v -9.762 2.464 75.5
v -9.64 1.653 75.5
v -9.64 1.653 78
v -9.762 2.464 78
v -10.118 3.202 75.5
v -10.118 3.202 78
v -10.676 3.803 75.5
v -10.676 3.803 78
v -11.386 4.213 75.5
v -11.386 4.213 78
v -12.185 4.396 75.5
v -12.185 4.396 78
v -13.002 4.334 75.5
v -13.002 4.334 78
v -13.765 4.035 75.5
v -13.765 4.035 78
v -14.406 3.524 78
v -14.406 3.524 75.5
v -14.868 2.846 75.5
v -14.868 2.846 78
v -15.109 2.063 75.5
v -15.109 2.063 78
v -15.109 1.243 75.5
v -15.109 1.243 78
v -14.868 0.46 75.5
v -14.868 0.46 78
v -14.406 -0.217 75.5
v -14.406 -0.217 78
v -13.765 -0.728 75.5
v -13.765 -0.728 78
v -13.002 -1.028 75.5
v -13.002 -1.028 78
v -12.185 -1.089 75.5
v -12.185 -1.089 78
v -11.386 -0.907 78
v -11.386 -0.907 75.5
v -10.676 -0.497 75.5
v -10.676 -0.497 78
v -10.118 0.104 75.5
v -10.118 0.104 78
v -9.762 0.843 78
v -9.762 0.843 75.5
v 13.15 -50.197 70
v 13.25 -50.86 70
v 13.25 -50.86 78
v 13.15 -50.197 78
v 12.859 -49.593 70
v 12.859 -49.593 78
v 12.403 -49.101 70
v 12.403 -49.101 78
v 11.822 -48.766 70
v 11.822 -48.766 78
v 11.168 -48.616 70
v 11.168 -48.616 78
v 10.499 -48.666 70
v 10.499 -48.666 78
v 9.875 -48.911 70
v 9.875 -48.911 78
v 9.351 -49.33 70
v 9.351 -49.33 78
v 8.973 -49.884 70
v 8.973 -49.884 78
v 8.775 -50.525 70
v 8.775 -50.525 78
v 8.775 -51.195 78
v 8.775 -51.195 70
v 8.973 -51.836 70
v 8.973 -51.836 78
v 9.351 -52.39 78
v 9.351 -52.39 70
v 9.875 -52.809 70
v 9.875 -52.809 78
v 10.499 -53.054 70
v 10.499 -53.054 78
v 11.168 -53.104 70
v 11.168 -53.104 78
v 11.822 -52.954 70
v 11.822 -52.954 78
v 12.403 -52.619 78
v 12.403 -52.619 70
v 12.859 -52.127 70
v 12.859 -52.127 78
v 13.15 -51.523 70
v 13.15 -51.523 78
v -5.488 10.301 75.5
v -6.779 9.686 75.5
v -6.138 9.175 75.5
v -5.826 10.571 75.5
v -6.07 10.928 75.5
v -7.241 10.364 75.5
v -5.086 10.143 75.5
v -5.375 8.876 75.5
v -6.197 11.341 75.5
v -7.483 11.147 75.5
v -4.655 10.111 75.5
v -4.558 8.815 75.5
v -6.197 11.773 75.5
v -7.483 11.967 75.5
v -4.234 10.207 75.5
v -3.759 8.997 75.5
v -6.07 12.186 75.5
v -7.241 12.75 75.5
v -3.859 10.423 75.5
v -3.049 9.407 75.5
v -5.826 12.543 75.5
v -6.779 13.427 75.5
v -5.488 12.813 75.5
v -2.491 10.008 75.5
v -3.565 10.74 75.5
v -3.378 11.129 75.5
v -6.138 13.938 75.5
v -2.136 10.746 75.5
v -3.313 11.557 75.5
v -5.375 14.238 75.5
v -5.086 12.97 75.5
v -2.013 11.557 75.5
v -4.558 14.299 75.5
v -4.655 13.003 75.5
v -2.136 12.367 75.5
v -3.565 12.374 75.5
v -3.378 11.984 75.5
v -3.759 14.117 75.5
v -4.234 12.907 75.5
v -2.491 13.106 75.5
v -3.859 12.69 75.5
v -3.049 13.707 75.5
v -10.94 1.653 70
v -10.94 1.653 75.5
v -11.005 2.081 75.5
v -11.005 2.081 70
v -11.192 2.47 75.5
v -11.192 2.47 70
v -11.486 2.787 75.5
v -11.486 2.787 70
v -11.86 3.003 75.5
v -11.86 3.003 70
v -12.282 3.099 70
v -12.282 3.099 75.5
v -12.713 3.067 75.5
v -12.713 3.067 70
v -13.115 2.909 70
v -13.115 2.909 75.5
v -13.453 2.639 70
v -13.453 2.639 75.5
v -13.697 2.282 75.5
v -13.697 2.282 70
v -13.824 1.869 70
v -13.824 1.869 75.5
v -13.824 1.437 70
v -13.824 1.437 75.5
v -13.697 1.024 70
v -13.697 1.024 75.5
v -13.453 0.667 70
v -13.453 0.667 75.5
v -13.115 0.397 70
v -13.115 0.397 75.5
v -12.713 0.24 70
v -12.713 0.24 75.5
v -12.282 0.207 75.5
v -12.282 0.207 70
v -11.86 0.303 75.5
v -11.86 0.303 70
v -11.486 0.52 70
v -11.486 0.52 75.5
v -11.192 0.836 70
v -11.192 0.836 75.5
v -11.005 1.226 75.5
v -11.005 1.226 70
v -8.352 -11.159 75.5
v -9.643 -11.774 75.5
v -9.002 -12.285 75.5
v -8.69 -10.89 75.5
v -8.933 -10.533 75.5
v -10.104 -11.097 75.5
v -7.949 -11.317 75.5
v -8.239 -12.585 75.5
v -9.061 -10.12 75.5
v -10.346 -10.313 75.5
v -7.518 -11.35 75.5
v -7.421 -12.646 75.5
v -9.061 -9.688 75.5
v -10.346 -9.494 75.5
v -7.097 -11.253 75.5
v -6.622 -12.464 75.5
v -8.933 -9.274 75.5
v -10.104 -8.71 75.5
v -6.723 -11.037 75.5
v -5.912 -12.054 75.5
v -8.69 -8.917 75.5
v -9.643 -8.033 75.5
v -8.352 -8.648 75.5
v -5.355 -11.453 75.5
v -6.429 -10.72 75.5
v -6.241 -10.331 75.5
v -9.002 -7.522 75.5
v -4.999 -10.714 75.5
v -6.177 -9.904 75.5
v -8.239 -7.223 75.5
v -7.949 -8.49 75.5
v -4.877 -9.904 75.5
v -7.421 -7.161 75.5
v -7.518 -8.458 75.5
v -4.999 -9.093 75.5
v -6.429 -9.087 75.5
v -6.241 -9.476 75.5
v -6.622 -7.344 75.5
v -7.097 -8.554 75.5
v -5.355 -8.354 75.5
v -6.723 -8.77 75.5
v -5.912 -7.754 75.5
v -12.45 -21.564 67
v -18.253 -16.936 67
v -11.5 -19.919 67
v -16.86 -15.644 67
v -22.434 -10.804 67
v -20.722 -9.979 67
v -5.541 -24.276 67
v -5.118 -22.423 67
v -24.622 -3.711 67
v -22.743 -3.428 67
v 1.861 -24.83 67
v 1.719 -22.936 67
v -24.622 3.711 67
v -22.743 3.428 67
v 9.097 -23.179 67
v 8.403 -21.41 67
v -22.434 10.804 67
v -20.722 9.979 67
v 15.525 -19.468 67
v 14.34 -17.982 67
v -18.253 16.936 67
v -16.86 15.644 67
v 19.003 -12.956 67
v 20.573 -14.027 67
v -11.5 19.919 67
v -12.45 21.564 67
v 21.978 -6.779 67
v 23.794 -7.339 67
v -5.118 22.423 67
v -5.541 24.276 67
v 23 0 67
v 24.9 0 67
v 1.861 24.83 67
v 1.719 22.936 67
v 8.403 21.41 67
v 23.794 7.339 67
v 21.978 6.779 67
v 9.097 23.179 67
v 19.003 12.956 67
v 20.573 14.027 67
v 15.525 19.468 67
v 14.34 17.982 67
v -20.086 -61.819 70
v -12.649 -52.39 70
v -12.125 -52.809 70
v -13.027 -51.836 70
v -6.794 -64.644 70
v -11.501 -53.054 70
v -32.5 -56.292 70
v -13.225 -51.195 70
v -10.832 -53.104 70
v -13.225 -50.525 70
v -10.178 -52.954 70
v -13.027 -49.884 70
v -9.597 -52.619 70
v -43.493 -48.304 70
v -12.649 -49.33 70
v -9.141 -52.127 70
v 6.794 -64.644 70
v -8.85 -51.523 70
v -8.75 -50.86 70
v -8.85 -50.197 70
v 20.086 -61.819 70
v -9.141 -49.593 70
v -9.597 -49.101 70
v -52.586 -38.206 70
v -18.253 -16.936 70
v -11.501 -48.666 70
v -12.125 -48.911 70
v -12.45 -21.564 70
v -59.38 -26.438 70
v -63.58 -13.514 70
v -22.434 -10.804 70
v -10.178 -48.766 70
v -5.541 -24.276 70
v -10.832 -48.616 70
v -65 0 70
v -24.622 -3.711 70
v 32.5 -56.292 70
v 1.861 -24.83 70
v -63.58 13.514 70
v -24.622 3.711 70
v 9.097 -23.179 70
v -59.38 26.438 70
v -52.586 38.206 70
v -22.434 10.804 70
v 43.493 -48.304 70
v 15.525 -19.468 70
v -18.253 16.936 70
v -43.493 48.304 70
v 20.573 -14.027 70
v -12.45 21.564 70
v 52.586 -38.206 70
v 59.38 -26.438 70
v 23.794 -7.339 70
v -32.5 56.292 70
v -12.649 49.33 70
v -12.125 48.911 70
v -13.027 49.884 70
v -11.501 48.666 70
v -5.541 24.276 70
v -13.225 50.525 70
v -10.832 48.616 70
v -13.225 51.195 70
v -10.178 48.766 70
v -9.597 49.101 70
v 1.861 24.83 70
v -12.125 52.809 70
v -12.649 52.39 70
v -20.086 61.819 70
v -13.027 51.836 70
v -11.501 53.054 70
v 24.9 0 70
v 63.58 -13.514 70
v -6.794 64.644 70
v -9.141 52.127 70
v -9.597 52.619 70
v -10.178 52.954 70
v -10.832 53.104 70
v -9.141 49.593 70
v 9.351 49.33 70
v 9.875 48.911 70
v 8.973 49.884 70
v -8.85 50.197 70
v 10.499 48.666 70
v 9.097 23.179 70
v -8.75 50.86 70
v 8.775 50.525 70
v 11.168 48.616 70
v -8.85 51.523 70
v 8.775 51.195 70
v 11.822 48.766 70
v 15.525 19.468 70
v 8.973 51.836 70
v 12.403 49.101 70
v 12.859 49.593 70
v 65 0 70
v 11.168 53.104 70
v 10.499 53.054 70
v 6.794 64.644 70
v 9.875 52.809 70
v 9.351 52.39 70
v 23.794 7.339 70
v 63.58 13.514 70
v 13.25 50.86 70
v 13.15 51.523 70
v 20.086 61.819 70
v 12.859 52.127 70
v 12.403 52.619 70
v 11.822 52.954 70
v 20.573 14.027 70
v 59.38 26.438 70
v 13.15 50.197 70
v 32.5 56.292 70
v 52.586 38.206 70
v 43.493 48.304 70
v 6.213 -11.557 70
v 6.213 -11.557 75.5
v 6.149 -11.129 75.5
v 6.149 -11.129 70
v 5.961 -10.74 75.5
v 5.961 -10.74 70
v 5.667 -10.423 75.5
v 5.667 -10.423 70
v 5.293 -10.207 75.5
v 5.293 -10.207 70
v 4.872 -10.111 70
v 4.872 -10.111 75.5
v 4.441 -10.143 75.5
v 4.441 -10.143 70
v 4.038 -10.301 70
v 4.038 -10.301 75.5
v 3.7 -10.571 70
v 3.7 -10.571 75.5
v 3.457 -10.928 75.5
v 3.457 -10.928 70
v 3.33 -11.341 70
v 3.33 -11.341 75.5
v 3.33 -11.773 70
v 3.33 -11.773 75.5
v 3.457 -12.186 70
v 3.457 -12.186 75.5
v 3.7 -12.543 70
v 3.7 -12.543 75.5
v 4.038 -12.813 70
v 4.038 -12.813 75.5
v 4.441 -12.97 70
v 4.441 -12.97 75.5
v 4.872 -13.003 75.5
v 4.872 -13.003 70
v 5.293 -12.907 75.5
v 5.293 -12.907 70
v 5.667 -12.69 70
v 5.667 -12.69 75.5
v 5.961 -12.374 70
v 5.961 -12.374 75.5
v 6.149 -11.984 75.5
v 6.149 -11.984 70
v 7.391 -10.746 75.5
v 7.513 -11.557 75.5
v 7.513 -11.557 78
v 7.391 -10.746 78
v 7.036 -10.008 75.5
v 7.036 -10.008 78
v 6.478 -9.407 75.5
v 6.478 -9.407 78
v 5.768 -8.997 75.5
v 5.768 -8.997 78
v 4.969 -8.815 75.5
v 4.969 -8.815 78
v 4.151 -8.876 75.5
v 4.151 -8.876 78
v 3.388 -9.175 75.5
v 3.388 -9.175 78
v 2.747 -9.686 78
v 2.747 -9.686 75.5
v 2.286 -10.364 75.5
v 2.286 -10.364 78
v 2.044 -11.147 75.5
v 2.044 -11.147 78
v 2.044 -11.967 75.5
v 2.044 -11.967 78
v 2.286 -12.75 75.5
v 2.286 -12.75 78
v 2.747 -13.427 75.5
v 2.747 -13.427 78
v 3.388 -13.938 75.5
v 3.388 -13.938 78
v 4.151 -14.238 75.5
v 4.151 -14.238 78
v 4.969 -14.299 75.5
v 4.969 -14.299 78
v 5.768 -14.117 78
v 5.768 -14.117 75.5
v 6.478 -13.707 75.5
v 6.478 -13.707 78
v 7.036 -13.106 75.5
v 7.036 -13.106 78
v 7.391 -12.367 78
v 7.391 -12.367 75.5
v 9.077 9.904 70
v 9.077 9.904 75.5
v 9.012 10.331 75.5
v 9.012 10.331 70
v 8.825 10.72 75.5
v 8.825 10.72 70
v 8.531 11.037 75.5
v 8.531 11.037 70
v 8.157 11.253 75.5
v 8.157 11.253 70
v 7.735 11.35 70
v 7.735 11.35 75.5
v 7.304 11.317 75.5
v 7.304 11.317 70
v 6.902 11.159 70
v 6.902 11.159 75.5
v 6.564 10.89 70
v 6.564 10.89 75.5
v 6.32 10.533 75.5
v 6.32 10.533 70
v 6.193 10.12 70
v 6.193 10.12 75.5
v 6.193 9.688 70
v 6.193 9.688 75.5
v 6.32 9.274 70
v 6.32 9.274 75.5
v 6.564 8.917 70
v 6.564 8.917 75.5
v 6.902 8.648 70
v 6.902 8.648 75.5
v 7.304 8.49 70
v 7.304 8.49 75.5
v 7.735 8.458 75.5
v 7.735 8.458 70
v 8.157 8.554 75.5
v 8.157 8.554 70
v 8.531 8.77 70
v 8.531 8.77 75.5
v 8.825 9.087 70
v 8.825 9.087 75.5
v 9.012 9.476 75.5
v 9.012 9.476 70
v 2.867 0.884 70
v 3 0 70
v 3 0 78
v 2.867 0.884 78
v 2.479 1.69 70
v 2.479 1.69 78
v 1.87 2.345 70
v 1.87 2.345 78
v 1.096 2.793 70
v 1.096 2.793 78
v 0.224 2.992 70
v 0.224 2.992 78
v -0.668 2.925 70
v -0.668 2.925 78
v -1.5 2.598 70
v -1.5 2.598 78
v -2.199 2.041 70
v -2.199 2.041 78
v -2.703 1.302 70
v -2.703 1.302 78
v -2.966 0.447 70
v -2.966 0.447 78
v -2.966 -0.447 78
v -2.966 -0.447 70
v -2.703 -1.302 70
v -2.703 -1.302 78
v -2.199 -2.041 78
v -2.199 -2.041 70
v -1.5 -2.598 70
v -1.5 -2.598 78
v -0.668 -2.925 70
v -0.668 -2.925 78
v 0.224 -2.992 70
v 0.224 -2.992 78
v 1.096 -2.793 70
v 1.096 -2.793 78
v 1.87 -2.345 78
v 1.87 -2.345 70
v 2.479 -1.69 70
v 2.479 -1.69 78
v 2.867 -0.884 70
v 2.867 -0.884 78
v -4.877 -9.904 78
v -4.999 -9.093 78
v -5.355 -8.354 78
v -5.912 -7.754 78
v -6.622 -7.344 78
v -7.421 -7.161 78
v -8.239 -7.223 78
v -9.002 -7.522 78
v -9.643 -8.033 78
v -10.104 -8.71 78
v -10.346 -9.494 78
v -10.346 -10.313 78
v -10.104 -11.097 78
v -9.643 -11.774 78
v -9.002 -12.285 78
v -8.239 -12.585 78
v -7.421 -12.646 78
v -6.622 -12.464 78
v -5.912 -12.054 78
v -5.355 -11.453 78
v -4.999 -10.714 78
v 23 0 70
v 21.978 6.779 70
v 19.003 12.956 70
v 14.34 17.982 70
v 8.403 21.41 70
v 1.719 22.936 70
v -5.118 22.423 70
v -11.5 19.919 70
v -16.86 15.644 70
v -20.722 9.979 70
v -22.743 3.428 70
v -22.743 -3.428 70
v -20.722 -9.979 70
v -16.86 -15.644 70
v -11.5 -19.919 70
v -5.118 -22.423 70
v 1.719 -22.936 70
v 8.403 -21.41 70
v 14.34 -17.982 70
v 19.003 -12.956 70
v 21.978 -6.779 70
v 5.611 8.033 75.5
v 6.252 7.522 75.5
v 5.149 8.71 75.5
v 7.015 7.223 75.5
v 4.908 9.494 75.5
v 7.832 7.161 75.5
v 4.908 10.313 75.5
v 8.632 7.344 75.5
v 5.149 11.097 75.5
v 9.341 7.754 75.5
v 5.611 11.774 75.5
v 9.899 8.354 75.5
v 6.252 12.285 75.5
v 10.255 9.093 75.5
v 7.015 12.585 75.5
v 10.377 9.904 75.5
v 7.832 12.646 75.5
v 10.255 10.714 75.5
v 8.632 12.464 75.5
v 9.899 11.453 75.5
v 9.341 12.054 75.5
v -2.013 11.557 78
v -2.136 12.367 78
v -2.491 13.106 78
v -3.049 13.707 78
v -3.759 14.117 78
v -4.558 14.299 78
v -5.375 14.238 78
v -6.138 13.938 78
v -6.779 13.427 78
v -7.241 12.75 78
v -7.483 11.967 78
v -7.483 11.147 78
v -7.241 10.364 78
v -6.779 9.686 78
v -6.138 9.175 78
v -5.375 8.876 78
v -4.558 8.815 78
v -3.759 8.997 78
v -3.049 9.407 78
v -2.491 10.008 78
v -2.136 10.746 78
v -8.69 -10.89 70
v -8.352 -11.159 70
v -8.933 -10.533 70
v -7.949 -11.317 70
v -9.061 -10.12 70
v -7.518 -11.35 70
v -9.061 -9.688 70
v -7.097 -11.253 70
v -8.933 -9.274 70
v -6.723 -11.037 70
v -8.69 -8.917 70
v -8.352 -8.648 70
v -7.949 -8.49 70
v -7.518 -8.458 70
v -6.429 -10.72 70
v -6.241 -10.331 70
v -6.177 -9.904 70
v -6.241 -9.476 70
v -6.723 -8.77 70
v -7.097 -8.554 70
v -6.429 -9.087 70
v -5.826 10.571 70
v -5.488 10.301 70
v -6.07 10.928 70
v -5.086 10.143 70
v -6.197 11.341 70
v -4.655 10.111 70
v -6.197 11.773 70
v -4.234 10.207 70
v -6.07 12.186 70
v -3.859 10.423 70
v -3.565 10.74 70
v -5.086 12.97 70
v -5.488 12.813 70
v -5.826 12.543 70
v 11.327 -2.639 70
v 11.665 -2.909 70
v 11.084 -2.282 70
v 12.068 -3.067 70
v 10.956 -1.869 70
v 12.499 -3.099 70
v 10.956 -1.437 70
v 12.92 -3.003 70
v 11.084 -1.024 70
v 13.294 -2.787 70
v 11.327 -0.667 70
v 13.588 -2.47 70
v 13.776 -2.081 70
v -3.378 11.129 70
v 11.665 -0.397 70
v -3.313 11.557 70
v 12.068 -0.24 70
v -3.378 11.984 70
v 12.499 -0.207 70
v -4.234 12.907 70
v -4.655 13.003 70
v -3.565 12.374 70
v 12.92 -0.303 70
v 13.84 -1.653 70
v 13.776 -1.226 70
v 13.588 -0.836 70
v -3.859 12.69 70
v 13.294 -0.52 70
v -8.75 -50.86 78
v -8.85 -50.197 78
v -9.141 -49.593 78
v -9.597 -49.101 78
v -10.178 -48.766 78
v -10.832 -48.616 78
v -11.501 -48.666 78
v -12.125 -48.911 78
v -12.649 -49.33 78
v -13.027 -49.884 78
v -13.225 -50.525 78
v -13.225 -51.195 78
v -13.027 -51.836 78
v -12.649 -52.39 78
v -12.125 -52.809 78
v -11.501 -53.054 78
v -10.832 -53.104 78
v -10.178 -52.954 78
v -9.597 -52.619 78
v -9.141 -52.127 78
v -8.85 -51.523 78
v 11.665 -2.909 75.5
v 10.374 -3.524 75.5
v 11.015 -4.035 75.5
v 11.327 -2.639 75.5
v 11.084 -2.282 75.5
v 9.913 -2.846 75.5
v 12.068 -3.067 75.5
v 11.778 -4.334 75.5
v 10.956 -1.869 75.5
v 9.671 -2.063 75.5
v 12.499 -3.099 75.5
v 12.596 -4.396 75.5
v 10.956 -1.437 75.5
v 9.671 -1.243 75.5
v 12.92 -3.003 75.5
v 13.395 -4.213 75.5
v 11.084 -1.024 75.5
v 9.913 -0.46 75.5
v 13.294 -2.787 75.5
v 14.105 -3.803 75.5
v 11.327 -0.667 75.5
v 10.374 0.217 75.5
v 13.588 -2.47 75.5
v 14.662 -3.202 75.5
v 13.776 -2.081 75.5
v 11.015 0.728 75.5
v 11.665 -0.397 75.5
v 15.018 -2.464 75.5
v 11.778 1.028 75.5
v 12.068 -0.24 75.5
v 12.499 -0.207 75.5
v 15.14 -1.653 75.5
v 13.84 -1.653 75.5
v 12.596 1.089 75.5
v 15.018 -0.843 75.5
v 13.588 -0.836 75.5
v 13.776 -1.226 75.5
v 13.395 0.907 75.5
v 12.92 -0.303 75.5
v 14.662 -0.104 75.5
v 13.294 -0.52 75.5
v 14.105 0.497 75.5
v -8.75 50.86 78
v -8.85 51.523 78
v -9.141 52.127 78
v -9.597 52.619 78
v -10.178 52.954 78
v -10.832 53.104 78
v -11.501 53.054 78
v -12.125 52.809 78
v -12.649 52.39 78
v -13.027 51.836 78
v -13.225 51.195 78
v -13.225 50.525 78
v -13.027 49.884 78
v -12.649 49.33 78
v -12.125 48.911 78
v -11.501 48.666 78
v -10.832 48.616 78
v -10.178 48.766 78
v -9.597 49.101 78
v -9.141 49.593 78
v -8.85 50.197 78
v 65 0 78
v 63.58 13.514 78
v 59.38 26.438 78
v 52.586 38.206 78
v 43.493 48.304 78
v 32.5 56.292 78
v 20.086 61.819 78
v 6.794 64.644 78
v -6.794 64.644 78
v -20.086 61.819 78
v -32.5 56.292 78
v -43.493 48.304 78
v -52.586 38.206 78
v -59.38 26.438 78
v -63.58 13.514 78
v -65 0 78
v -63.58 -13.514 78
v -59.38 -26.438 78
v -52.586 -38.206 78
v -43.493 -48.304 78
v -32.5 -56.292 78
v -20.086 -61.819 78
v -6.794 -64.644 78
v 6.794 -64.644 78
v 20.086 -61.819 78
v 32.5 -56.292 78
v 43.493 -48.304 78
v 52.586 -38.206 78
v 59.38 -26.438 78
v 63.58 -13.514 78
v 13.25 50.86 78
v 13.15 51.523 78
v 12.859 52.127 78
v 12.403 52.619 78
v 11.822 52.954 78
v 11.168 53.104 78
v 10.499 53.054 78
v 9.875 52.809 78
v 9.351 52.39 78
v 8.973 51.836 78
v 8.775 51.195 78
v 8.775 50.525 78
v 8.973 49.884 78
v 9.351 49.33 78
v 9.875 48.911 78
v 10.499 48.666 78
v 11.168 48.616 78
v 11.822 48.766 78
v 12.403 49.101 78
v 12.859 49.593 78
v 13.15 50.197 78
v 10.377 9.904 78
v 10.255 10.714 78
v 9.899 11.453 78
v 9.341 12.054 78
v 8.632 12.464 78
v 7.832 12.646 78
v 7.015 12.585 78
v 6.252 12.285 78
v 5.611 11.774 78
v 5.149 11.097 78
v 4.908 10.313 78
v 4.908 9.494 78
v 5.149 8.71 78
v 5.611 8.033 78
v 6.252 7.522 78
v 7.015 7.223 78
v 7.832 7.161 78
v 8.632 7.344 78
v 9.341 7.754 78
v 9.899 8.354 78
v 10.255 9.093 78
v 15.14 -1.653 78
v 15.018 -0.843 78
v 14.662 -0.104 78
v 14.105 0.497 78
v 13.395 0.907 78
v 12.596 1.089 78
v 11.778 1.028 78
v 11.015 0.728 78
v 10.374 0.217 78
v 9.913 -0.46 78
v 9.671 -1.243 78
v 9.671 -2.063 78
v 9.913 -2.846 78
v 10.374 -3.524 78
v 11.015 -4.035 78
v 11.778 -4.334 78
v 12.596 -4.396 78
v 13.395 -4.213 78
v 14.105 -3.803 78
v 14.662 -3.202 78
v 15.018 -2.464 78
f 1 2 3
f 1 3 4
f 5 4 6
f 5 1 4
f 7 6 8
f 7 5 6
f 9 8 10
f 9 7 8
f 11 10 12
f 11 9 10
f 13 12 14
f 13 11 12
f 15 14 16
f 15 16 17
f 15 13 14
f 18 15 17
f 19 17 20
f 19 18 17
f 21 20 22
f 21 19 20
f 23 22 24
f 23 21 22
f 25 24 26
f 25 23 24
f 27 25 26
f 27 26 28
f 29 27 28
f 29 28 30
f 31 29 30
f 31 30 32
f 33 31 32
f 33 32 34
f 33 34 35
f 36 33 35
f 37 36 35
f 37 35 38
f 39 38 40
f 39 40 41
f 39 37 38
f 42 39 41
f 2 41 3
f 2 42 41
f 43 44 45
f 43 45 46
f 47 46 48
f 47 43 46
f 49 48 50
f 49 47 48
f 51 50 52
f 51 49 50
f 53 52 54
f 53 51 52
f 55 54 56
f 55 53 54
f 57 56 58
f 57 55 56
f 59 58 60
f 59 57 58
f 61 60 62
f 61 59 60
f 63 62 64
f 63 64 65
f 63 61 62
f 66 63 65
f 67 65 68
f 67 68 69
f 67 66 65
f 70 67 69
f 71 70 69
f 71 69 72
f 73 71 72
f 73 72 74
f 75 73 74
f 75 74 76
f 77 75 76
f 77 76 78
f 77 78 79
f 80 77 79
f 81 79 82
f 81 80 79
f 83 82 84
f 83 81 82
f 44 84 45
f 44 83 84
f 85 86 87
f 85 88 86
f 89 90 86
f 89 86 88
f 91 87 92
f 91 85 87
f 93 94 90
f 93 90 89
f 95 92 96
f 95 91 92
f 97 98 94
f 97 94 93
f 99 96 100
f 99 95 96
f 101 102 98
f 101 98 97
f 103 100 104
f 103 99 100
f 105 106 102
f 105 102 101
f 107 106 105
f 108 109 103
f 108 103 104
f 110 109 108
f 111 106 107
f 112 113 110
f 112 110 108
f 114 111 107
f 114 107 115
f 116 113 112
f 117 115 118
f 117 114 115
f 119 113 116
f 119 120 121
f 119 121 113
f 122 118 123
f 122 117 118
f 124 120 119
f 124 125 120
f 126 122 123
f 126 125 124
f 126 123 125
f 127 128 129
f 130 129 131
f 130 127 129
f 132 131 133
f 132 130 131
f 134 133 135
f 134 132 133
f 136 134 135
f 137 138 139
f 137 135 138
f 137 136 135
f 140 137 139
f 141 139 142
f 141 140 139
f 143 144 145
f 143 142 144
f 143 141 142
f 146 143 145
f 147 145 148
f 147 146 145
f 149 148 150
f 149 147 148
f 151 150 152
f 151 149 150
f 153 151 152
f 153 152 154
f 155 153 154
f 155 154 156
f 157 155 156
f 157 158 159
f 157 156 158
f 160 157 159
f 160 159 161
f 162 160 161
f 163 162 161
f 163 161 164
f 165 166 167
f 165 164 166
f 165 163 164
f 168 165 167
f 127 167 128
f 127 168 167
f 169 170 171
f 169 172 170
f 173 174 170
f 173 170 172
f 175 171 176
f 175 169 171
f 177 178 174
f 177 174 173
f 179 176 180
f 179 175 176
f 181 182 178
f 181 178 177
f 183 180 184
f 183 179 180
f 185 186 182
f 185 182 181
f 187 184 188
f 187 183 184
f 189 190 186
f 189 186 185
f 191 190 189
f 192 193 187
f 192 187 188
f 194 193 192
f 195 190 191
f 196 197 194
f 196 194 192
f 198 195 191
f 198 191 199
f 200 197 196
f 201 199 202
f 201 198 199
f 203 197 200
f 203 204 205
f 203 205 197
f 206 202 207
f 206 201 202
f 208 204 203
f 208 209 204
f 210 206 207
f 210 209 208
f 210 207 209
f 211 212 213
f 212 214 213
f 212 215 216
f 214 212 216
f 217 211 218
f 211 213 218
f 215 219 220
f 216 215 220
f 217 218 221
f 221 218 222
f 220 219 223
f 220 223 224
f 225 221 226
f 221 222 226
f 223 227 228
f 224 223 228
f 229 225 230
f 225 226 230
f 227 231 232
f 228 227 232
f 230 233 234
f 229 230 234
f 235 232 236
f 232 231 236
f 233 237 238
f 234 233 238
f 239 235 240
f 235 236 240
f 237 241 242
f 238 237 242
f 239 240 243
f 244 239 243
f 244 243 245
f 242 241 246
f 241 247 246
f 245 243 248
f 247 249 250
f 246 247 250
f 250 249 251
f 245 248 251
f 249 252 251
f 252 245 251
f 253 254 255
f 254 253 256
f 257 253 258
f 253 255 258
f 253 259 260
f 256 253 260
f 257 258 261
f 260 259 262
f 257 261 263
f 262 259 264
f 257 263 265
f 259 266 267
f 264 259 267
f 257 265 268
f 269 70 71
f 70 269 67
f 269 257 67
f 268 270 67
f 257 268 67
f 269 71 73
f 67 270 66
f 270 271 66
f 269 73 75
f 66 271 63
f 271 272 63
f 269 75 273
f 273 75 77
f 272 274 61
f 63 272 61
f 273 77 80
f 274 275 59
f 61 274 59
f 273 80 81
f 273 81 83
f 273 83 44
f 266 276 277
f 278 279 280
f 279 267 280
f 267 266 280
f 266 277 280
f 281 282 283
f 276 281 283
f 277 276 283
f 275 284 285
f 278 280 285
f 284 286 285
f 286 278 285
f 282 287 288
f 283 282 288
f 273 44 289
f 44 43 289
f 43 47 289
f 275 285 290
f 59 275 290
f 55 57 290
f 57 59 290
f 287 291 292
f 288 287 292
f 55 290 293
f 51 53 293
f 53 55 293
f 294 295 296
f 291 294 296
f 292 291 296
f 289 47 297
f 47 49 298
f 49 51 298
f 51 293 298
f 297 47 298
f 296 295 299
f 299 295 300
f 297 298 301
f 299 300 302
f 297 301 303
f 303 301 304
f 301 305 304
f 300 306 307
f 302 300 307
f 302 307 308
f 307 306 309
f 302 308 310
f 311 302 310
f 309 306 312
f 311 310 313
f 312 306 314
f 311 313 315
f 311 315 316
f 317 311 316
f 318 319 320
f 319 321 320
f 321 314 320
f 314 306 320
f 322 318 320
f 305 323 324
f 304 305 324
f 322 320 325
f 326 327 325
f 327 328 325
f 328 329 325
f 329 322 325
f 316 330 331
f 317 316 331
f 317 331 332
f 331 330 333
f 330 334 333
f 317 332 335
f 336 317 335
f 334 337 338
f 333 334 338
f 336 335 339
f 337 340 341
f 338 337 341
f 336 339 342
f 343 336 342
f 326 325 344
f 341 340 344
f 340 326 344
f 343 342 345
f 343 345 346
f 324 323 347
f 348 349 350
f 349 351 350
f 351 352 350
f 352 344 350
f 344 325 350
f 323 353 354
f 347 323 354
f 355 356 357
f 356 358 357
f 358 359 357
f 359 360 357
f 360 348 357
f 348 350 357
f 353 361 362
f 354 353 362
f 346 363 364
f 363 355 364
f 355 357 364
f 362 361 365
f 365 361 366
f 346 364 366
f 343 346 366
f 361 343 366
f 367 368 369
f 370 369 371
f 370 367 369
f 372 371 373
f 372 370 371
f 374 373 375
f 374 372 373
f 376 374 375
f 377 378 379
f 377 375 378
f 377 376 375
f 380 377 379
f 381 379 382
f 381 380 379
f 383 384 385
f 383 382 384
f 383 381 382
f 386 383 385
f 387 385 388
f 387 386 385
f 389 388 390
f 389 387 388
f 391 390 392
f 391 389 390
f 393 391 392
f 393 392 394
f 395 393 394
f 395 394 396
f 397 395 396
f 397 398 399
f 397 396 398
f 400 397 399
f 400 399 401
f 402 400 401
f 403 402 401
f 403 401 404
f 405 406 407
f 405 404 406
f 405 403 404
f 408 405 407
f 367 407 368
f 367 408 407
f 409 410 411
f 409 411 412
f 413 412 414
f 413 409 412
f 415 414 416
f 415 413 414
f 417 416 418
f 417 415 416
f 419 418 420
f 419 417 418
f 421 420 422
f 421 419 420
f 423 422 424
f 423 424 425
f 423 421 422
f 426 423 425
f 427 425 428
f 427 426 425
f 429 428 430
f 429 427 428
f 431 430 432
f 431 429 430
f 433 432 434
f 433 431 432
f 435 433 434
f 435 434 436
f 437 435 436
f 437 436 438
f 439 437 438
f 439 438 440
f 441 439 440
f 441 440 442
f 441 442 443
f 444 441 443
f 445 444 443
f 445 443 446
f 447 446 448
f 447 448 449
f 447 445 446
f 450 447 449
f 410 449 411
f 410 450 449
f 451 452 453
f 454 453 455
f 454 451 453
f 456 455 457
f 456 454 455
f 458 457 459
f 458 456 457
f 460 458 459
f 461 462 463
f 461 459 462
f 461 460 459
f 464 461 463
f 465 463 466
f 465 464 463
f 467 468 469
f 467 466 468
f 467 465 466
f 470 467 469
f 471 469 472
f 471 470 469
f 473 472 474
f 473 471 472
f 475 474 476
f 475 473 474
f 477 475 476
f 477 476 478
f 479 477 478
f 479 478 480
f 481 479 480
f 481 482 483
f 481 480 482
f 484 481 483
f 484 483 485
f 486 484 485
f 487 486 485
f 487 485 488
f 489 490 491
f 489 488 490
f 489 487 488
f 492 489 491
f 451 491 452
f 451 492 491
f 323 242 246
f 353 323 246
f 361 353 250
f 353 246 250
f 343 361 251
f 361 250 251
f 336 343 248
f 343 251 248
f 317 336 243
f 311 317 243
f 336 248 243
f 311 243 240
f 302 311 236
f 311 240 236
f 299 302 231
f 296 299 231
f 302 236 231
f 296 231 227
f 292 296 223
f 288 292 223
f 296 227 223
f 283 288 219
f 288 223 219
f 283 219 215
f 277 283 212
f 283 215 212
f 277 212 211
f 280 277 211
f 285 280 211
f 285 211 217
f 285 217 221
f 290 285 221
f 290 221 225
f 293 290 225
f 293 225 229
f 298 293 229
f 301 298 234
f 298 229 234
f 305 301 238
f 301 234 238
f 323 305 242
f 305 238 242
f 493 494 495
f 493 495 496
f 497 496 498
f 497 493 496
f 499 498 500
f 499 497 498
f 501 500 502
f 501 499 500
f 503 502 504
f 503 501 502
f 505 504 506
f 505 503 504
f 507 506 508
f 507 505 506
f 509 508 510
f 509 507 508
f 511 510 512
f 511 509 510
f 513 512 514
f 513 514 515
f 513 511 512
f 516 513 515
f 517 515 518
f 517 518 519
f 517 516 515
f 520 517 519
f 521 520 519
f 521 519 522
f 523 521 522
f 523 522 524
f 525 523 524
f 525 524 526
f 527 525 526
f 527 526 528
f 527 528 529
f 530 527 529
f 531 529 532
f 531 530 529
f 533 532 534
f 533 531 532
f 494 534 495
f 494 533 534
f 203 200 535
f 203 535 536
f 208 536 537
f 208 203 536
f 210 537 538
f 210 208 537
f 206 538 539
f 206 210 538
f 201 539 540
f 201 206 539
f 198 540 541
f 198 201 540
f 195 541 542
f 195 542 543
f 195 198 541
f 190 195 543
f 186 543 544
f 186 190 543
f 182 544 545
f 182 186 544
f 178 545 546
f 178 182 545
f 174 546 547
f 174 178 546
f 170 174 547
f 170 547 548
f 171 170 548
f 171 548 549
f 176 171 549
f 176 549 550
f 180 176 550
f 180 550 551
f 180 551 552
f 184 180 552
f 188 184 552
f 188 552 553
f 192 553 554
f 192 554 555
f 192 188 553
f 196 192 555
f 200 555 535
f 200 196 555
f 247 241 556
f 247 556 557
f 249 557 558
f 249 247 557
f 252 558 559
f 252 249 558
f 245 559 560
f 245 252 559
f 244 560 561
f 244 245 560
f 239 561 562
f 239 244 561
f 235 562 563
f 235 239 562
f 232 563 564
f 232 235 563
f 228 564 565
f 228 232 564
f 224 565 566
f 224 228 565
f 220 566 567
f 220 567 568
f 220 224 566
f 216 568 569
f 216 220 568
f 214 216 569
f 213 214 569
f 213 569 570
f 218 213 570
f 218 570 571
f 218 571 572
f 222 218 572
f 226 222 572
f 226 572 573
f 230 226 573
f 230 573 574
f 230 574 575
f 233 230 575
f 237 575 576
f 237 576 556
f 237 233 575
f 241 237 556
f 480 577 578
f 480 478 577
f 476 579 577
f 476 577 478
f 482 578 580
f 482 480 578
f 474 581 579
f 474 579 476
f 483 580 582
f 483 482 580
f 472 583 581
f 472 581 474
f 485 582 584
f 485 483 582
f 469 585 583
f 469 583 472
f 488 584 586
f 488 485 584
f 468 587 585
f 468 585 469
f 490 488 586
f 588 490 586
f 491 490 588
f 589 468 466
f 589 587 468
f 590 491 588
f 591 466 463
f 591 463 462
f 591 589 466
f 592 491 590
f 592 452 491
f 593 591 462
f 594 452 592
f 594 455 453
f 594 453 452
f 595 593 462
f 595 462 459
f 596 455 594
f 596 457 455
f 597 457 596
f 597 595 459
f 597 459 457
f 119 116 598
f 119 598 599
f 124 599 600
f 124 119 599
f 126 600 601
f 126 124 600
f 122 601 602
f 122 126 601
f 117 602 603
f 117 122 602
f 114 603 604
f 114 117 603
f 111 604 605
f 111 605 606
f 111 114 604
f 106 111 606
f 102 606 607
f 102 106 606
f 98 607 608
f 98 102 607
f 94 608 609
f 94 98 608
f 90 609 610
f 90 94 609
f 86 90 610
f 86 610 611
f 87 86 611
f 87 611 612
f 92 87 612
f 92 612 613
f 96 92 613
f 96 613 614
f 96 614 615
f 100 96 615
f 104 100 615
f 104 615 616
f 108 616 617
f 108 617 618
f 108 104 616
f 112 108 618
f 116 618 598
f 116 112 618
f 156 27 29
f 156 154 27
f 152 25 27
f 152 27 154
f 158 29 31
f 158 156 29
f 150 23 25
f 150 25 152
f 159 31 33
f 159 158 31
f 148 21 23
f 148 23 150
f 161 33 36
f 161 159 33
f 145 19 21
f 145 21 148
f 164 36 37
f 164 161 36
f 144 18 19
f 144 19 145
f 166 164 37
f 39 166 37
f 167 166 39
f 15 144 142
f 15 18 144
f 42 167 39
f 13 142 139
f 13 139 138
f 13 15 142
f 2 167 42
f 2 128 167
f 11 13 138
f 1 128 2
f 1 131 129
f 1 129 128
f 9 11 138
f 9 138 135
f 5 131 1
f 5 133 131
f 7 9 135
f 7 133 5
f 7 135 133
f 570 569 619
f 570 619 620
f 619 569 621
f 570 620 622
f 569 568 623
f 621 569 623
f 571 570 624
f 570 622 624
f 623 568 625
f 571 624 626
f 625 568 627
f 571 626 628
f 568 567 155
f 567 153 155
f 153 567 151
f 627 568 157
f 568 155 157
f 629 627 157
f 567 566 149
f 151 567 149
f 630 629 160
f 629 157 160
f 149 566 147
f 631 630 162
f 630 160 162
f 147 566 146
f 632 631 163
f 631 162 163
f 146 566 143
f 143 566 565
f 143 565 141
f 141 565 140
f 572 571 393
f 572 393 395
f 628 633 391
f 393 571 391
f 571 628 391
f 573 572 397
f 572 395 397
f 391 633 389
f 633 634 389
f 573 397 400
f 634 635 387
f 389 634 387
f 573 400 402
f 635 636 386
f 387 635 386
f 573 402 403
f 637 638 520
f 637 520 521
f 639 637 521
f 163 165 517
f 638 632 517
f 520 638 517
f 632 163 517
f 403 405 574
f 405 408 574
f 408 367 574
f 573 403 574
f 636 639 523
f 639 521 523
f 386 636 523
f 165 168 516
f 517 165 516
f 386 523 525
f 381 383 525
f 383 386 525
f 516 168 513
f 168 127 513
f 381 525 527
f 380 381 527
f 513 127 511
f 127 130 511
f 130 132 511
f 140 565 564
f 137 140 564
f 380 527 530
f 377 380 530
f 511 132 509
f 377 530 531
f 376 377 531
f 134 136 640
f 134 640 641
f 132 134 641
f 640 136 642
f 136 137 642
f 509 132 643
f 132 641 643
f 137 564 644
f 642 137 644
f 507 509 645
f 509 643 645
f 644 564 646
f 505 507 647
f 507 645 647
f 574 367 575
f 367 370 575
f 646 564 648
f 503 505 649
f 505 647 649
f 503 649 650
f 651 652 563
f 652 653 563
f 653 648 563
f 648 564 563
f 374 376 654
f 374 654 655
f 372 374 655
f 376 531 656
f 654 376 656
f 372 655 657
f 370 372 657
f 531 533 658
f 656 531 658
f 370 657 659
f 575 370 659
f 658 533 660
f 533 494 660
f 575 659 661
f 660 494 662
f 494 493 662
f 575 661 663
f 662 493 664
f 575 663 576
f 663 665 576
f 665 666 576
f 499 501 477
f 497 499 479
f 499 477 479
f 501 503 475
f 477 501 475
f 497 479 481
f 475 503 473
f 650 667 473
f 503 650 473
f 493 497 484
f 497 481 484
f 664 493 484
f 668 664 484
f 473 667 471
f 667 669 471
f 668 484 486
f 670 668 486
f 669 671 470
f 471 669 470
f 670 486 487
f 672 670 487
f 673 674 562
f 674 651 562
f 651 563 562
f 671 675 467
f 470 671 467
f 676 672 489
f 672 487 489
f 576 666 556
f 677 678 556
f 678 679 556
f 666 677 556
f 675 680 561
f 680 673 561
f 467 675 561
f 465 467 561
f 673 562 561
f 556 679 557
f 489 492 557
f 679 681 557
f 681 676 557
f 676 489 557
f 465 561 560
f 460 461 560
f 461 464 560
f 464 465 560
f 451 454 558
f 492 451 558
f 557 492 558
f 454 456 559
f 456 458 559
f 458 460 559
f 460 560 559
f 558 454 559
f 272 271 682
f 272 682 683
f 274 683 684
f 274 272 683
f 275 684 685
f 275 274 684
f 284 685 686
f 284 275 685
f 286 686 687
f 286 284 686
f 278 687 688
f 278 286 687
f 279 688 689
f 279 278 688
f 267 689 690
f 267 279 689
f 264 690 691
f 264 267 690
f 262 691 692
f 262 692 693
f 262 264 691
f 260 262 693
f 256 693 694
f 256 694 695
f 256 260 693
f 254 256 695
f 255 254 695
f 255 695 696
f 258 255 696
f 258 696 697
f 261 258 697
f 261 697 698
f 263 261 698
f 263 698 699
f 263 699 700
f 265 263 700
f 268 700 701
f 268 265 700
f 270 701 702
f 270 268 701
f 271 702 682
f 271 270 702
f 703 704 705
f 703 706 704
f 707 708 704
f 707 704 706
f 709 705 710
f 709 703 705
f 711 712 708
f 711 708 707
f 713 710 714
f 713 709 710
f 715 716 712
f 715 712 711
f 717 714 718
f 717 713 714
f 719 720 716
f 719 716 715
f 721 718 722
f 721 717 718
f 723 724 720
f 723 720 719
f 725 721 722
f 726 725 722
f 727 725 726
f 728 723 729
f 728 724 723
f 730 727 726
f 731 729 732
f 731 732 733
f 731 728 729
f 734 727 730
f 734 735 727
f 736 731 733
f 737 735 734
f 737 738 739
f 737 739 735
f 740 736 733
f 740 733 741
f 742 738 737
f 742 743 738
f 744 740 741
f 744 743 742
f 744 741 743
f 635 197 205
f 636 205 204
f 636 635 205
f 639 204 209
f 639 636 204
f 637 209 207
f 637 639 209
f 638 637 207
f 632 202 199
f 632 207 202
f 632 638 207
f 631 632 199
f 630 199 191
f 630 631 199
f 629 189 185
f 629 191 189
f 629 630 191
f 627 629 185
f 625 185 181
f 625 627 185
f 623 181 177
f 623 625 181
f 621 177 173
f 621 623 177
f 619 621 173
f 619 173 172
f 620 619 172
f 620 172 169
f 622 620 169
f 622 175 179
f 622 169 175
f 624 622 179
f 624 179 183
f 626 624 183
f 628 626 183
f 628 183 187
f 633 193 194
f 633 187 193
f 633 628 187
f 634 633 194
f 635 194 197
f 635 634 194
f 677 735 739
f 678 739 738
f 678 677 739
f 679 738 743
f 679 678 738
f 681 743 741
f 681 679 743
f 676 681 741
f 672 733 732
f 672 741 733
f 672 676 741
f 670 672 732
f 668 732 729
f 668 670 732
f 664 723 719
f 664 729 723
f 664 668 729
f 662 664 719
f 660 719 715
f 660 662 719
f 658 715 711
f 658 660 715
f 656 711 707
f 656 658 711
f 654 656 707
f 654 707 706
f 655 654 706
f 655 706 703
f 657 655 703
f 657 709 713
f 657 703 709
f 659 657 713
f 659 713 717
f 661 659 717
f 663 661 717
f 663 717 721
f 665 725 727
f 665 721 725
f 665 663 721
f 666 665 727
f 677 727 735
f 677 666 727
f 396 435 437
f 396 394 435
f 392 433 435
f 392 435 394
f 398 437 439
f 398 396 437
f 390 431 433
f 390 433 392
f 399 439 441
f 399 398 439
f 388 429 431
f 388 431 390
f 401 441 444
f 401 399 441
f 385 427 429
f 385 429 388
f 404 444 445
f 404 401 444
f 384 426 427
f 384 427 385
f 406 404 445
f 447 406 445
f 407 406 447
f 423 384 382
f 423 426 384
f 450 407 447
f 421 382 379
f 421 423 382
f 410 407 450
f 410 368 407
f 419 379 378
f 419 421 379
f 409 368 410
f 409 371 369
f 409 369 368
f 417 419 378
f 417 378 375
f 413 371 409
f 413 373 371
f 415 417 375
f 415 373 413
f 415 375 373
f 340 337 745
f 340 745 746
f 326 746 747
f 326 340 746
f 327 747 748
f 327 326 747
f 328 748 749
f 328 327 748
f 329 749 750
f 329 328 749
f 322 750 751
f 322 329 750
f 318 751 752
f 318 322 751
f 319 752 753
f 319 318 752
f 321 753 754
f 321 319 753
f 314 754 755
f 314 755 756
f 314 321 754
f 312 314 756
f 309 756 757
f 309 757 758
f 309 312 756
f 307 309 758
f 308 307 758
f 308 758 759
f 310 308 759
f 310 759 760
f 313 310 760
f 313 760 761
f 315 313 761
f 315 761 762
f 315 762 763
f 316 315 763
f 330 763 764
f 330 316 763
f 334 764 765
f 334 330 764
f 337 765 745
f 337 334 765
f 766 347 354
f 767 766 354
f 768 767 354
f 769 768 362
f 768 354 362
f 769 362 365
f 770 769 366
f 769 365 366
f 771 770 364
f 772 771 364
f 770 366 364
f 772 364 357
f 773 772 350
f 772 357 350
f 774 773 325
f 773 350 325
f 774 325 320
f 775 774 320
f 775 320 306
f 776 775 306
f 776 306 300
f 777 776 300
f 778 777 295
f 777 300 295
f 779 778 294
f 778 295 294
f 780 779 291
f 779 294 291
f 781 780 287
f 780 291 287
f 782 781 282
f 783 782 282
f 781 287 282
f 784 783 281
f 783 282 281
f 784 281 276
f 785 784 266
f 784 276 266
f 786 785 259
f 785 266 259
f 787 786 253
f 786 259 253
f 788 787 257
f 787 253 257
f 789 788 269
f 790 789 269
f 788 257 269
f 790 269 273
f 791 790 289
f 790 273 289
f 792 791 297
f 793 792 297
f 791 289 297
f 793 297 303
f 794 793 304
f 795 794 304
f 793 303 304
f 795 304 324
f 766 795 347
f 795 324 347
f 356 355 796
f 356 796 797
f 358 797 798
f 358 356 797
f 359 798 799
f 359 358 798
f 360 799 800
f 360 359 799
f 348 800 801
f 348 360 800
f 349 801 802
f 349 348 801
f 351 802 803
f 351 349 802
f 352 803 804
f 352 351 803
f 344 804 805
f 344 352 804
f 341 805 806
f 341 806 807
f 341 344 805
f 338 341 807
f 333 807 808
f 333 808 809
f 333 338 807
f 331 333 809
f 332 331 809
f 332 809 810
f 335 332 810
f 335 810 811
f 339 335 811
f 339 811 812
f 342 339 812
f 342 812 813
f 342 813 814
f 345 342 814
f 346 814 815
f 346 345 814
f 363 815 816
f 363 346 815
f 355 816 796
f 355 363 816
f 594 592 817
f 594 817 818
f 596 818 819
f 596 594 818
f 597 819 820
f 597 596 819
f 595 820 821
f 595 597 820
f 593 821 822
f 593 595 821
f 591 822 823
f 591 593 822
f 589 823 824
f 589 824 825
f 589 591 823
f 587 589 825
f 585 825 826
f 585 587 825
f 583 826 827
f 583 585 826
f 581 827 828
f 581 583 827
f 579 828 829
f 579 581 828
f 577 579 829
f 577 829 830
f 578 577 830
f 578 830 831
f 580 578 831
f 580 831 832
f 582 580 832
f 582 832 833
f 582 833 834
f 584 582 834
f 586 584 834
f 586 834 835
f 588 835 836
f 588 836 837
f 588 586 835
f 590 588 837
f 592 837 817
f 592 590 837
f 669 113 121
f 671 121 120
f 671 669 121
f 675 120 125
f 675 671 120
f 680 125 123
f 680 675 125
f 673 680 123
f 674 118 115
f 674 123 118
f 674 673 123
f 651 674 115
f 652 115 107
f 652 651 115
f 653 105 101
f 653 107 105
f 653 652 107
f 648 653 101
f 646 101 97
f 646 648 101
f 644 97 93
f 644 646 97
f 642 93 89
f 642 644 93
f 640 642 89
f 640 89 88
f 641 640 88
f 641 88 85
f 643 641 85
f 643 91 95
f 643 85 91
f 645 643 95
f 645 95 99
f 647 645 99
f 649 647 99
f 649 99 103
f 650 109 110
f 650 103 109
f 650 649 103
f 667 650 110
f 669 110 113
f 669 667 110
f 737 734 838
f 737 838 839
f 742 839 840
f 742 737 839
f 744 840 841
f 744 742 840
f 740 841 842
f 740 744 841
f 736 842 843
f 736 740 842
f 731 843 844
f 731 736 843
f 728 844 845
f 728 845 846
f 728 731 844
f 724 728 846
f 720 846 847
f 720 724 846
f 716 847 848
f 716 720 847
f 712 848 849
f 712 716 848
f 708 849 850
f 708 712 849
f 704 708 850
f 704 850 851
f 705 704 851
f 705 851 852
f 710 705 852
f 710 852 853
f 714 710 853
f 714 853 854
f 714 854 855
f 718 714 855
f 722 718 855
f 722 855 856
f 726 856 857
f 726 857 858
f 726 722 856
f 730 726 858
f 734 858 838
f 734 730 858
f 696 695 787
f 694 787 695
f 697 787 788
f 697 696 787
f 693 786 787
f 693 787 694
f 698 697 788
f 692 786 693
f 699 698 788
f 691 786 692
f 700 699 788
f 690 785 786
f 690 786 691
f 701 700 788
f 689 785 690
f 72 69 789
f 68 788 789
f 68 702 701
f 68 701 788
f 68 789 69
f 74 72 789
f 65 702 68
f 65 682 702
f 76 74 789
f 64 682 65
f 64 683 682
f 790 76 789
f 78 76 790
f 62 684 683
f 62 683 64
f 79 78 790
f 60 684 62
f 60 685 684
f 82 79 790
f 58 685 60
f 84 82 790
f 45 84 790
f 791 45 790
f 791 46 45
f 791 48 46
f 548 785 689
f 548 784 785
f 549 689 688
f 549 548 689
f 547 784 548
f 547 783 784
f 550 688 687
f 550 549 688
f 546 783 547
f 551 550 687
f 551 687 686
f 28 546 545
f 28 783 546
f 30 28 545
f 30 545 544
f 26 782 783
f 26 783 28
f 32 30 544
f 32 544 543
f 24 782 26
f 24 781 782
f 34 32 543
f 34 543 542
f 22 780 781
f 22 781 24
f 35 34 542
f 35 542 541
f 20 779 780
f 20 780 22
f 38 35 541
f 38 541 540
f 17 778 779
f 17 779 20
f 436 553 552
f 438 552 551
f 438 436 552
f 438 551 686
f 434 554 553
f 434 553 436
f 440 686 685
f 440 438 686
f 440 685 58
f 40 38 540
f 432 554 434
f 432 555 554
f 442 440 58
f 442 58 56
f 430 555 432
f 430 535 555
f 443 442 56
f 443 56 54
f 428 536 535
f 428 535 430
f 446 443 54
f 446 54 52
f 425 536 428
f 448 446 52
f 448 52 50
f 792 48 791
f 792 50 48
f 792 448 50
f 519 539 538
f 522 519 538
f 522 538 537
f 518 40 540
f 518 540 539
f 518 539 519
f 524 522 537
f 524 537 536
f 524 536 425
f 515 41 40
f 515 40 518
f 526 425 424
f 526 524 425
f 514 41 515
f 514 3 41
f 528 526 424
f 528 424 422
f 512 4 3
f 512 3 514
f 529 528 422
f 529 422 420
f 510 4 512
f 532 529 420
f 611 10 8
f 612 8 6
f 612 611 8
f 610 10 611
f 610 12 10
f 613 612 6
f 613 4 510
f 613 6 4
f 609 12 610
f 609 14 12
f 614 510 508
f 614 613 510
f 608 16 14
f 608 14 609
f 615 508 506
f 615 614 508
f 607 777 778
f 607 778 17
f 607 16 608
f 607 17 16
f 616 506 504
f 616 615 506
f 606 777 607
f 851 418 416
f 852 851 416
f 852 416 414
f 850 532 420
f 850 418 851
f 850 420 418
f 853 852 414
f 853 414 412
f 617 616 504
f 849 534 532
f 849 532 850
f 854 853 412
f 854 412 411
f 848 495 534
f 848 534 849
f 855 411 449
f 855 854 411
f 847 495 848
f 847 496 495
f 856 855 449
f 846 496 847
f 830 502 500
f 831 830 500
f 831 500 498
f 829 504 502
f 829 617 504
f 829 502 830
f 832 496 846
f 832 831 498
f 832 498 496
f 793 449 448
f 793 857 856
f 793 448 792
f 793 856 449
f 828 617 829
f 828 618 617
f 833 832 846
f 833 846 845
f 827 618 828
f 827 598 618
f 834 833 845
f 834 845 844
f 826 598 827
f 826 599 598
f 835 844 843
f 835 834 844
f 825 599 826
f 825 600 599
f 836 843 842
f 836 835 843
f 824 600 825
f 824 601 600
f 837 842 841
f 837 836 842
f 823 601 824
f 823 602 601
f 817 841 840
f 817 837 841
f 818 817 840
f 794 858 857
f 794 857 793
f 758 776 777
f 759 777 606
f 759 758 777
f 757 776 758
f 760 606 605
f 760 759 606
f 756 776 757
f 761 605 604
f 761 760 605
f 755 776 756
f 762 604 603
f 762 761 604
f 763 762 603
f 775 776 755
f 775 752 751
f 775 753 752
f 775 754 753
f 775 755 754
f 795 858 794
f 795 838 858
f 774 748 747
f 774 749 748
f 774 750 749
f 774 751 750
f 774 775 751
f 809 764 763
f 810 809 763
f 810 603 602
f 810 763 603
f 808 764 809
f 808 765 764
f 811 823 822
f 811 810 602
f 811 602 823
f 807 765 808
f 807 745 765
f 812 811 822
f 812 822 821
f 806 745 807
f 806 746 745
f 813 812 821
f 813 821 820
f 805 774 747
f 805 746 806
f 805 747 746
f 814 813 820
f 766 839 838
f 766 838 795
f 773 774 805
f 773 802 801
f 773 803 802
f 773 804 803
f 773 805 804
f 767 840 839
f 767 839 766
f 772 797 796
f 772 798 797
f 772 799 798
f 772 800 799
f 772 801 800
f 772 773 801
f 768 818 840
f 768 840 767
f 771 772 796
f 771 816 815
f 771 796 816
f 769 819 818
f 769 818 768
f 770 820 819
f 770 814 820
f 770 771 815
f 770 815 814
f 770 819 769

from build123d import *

# Parameters (mm, degrees)
DISCO_START                         = 70
SK_DISCO_R                          = 65
DISCO_DEPTH                         = 8
CENTRADOR_ARANDELA_EJE_51110_START  = 67
SK_CENTRADOR_ARANDELA_EJE_51110_R   = 24.9
SK_CENTRADOR_ARANDELA_EJE_51110_R_2 = 23
CENTRADOR_ARANDELA_EJE_51110_DEPTH  = 3
PASANTES_M2_5_ROTOR_J1_START        = 70
SK_PASANTES_M2_5_ROTOR_J1_R         = 1.45
PASANTES_M2_5_ROTOR_J1_DEPTH        = 8
CAJAS_M2_5_START                    = 75.5
SK_CAJAS_M2_5_R                     = 2.75
CAJAS_M2_5_DEPTH                    = 2.5
PASO_CABLE_START                    = 70
SK_PASO_CABLE_R                     = 3
PASO_CABLE_DEPTH                    = 8
PASANTES_M4_ANGULOS_START           = 70
SK_PASANTES_M4_ANGULOS_R            = 2.25
PASANTES_M4_ANGULOS_DEPTH           = 8


with BuildPart() as part:
    # Sk_Disco → Disco (new body)
    with BuildSketch(Plane.XY.offset(DISCO_START)):
        Circle(SK_DISCO_R)
    extrude(amount=DISCO_DEPTH)

    # Sk_Centrador_arandela_eje_51110 → Centrador_arandela_eje_51110 (add)
    with BuildSketch(Plane.XY.offset(CENTRADOR_ARANDELA_EJE_51110_START)):
        Circle(SK_CENTRADOR_ARANDELA_EJE_51110_R)
        Circle(SK_CENTRADOR_ARANDELA_EJE_51110_R_2, mode=Mode.SUBTRACT)
    extrude(amount=CENTRADOR_ARANDELA_EJE_51110_DEPTH)

    # Sk_Pasantes_M2-5_rotor_J1 → Pasantes_M2-5_rotor_J1 (cut)
    with BuildSketch(Plane.XY.offset(PASANTES_M2_5_ROTOR_J1_START)):
        with Locations((12.390194253, -1.653204878)):
            Circle(SK_PASANTES_M2_5_ROTOR_J1_R)
        with Locations((7.626814549, 9.903620542)):
            Circle(SK_PASANTES_M2_5_ROTOR_J1_R)
        with Locations((-4.763379704, 11.55682542)):
            Circle(SK_PASANTES_M2_5_ROTOR_J1_R)
        with Locations((-12.390194253, 1.653204878)):
            Circle(SK_PASANTES_M2_5_ROTOR_J1_R)
        with Locations((-7.626814549, -9.903620542)):
            Circle(SK_PASANTES_M2_5_ROTOR_J1_R)
        with Locations((4.763379704, -11.55682542)):
            Circle(SK_PASANTES_M2_5_ROTOR_J1_R)
    extrude(amount=PASANTES_M2_5_ROTOR_J1_DEPTH, mode=Mode.SUBTRACT)

    # Sk_Cajas_M2-5 → Cajas_M2-5 (cut)
    with BuildSketch(Plane.XY.offset(CAJAS_M2_5_START)):
        with Locations((12.390194253, -1.653204878)):
            Circle(SK_CAJAS_M2_5_R)
        with Locations((7.626814549, 9.903620542)):
            Circle(SK_CAJAS_M2_5_R)
        with Locations((-4.763379704, 11.55682542)):
            Circle(SK_CAJAS_M2_5_R)
        with Locations((-12.390194253, 1.653204878)):
            Circle(SK_CAJAS_M2_5_R)
        with Locations((-7.626814549, -9.903620542)):
            Circle(SK_CAJAS_M2_5_R)
        with Locations((4.763379704, -11.55682542)):
            Circle(SK_CAJAS_M2_5_R)
    extrude(amount=CAJAS_M2_5_DEPTH, mode=Mode.SUBTRACT)

    # Sk_Paso_cable → Paso_cable (cut)
    with BuildSketch(Plane.XY.offset(PASO_CABLE_START)):
        Circle(SK_PASO_CABLE_R)
    extrude(amount=PASO_CABLE_DEPTH, mode=Mode.SUBTRACT)

    # Sk_Pasantes_M4_angulos → Pasantes_M4_angulos (cut)
    with BuildSketch(Plane.XY.offset(PASANTES_M4_ANGULOS_START)):
        with Locations((-11, -50.86)):
            Circle(SK_PASANTES_M4_ANGULOS_R)
        with Locations((-11, 50.86)):
            Circle(SK_PASANTES_M4_ANGULOS_R)
        with Locations((11, -50.86)):
            Circle(SK_PASANTES_M4_ANGULOS_R)
        with Locations((11, 50.86)):
            Circle(SK_PASANTES_M4_ANGULOS_R)
    extrude(amount=PASANTES_M4_ANGULOS_DEPTH, mode=Mode.SUBTRACT)


solid = part.part
